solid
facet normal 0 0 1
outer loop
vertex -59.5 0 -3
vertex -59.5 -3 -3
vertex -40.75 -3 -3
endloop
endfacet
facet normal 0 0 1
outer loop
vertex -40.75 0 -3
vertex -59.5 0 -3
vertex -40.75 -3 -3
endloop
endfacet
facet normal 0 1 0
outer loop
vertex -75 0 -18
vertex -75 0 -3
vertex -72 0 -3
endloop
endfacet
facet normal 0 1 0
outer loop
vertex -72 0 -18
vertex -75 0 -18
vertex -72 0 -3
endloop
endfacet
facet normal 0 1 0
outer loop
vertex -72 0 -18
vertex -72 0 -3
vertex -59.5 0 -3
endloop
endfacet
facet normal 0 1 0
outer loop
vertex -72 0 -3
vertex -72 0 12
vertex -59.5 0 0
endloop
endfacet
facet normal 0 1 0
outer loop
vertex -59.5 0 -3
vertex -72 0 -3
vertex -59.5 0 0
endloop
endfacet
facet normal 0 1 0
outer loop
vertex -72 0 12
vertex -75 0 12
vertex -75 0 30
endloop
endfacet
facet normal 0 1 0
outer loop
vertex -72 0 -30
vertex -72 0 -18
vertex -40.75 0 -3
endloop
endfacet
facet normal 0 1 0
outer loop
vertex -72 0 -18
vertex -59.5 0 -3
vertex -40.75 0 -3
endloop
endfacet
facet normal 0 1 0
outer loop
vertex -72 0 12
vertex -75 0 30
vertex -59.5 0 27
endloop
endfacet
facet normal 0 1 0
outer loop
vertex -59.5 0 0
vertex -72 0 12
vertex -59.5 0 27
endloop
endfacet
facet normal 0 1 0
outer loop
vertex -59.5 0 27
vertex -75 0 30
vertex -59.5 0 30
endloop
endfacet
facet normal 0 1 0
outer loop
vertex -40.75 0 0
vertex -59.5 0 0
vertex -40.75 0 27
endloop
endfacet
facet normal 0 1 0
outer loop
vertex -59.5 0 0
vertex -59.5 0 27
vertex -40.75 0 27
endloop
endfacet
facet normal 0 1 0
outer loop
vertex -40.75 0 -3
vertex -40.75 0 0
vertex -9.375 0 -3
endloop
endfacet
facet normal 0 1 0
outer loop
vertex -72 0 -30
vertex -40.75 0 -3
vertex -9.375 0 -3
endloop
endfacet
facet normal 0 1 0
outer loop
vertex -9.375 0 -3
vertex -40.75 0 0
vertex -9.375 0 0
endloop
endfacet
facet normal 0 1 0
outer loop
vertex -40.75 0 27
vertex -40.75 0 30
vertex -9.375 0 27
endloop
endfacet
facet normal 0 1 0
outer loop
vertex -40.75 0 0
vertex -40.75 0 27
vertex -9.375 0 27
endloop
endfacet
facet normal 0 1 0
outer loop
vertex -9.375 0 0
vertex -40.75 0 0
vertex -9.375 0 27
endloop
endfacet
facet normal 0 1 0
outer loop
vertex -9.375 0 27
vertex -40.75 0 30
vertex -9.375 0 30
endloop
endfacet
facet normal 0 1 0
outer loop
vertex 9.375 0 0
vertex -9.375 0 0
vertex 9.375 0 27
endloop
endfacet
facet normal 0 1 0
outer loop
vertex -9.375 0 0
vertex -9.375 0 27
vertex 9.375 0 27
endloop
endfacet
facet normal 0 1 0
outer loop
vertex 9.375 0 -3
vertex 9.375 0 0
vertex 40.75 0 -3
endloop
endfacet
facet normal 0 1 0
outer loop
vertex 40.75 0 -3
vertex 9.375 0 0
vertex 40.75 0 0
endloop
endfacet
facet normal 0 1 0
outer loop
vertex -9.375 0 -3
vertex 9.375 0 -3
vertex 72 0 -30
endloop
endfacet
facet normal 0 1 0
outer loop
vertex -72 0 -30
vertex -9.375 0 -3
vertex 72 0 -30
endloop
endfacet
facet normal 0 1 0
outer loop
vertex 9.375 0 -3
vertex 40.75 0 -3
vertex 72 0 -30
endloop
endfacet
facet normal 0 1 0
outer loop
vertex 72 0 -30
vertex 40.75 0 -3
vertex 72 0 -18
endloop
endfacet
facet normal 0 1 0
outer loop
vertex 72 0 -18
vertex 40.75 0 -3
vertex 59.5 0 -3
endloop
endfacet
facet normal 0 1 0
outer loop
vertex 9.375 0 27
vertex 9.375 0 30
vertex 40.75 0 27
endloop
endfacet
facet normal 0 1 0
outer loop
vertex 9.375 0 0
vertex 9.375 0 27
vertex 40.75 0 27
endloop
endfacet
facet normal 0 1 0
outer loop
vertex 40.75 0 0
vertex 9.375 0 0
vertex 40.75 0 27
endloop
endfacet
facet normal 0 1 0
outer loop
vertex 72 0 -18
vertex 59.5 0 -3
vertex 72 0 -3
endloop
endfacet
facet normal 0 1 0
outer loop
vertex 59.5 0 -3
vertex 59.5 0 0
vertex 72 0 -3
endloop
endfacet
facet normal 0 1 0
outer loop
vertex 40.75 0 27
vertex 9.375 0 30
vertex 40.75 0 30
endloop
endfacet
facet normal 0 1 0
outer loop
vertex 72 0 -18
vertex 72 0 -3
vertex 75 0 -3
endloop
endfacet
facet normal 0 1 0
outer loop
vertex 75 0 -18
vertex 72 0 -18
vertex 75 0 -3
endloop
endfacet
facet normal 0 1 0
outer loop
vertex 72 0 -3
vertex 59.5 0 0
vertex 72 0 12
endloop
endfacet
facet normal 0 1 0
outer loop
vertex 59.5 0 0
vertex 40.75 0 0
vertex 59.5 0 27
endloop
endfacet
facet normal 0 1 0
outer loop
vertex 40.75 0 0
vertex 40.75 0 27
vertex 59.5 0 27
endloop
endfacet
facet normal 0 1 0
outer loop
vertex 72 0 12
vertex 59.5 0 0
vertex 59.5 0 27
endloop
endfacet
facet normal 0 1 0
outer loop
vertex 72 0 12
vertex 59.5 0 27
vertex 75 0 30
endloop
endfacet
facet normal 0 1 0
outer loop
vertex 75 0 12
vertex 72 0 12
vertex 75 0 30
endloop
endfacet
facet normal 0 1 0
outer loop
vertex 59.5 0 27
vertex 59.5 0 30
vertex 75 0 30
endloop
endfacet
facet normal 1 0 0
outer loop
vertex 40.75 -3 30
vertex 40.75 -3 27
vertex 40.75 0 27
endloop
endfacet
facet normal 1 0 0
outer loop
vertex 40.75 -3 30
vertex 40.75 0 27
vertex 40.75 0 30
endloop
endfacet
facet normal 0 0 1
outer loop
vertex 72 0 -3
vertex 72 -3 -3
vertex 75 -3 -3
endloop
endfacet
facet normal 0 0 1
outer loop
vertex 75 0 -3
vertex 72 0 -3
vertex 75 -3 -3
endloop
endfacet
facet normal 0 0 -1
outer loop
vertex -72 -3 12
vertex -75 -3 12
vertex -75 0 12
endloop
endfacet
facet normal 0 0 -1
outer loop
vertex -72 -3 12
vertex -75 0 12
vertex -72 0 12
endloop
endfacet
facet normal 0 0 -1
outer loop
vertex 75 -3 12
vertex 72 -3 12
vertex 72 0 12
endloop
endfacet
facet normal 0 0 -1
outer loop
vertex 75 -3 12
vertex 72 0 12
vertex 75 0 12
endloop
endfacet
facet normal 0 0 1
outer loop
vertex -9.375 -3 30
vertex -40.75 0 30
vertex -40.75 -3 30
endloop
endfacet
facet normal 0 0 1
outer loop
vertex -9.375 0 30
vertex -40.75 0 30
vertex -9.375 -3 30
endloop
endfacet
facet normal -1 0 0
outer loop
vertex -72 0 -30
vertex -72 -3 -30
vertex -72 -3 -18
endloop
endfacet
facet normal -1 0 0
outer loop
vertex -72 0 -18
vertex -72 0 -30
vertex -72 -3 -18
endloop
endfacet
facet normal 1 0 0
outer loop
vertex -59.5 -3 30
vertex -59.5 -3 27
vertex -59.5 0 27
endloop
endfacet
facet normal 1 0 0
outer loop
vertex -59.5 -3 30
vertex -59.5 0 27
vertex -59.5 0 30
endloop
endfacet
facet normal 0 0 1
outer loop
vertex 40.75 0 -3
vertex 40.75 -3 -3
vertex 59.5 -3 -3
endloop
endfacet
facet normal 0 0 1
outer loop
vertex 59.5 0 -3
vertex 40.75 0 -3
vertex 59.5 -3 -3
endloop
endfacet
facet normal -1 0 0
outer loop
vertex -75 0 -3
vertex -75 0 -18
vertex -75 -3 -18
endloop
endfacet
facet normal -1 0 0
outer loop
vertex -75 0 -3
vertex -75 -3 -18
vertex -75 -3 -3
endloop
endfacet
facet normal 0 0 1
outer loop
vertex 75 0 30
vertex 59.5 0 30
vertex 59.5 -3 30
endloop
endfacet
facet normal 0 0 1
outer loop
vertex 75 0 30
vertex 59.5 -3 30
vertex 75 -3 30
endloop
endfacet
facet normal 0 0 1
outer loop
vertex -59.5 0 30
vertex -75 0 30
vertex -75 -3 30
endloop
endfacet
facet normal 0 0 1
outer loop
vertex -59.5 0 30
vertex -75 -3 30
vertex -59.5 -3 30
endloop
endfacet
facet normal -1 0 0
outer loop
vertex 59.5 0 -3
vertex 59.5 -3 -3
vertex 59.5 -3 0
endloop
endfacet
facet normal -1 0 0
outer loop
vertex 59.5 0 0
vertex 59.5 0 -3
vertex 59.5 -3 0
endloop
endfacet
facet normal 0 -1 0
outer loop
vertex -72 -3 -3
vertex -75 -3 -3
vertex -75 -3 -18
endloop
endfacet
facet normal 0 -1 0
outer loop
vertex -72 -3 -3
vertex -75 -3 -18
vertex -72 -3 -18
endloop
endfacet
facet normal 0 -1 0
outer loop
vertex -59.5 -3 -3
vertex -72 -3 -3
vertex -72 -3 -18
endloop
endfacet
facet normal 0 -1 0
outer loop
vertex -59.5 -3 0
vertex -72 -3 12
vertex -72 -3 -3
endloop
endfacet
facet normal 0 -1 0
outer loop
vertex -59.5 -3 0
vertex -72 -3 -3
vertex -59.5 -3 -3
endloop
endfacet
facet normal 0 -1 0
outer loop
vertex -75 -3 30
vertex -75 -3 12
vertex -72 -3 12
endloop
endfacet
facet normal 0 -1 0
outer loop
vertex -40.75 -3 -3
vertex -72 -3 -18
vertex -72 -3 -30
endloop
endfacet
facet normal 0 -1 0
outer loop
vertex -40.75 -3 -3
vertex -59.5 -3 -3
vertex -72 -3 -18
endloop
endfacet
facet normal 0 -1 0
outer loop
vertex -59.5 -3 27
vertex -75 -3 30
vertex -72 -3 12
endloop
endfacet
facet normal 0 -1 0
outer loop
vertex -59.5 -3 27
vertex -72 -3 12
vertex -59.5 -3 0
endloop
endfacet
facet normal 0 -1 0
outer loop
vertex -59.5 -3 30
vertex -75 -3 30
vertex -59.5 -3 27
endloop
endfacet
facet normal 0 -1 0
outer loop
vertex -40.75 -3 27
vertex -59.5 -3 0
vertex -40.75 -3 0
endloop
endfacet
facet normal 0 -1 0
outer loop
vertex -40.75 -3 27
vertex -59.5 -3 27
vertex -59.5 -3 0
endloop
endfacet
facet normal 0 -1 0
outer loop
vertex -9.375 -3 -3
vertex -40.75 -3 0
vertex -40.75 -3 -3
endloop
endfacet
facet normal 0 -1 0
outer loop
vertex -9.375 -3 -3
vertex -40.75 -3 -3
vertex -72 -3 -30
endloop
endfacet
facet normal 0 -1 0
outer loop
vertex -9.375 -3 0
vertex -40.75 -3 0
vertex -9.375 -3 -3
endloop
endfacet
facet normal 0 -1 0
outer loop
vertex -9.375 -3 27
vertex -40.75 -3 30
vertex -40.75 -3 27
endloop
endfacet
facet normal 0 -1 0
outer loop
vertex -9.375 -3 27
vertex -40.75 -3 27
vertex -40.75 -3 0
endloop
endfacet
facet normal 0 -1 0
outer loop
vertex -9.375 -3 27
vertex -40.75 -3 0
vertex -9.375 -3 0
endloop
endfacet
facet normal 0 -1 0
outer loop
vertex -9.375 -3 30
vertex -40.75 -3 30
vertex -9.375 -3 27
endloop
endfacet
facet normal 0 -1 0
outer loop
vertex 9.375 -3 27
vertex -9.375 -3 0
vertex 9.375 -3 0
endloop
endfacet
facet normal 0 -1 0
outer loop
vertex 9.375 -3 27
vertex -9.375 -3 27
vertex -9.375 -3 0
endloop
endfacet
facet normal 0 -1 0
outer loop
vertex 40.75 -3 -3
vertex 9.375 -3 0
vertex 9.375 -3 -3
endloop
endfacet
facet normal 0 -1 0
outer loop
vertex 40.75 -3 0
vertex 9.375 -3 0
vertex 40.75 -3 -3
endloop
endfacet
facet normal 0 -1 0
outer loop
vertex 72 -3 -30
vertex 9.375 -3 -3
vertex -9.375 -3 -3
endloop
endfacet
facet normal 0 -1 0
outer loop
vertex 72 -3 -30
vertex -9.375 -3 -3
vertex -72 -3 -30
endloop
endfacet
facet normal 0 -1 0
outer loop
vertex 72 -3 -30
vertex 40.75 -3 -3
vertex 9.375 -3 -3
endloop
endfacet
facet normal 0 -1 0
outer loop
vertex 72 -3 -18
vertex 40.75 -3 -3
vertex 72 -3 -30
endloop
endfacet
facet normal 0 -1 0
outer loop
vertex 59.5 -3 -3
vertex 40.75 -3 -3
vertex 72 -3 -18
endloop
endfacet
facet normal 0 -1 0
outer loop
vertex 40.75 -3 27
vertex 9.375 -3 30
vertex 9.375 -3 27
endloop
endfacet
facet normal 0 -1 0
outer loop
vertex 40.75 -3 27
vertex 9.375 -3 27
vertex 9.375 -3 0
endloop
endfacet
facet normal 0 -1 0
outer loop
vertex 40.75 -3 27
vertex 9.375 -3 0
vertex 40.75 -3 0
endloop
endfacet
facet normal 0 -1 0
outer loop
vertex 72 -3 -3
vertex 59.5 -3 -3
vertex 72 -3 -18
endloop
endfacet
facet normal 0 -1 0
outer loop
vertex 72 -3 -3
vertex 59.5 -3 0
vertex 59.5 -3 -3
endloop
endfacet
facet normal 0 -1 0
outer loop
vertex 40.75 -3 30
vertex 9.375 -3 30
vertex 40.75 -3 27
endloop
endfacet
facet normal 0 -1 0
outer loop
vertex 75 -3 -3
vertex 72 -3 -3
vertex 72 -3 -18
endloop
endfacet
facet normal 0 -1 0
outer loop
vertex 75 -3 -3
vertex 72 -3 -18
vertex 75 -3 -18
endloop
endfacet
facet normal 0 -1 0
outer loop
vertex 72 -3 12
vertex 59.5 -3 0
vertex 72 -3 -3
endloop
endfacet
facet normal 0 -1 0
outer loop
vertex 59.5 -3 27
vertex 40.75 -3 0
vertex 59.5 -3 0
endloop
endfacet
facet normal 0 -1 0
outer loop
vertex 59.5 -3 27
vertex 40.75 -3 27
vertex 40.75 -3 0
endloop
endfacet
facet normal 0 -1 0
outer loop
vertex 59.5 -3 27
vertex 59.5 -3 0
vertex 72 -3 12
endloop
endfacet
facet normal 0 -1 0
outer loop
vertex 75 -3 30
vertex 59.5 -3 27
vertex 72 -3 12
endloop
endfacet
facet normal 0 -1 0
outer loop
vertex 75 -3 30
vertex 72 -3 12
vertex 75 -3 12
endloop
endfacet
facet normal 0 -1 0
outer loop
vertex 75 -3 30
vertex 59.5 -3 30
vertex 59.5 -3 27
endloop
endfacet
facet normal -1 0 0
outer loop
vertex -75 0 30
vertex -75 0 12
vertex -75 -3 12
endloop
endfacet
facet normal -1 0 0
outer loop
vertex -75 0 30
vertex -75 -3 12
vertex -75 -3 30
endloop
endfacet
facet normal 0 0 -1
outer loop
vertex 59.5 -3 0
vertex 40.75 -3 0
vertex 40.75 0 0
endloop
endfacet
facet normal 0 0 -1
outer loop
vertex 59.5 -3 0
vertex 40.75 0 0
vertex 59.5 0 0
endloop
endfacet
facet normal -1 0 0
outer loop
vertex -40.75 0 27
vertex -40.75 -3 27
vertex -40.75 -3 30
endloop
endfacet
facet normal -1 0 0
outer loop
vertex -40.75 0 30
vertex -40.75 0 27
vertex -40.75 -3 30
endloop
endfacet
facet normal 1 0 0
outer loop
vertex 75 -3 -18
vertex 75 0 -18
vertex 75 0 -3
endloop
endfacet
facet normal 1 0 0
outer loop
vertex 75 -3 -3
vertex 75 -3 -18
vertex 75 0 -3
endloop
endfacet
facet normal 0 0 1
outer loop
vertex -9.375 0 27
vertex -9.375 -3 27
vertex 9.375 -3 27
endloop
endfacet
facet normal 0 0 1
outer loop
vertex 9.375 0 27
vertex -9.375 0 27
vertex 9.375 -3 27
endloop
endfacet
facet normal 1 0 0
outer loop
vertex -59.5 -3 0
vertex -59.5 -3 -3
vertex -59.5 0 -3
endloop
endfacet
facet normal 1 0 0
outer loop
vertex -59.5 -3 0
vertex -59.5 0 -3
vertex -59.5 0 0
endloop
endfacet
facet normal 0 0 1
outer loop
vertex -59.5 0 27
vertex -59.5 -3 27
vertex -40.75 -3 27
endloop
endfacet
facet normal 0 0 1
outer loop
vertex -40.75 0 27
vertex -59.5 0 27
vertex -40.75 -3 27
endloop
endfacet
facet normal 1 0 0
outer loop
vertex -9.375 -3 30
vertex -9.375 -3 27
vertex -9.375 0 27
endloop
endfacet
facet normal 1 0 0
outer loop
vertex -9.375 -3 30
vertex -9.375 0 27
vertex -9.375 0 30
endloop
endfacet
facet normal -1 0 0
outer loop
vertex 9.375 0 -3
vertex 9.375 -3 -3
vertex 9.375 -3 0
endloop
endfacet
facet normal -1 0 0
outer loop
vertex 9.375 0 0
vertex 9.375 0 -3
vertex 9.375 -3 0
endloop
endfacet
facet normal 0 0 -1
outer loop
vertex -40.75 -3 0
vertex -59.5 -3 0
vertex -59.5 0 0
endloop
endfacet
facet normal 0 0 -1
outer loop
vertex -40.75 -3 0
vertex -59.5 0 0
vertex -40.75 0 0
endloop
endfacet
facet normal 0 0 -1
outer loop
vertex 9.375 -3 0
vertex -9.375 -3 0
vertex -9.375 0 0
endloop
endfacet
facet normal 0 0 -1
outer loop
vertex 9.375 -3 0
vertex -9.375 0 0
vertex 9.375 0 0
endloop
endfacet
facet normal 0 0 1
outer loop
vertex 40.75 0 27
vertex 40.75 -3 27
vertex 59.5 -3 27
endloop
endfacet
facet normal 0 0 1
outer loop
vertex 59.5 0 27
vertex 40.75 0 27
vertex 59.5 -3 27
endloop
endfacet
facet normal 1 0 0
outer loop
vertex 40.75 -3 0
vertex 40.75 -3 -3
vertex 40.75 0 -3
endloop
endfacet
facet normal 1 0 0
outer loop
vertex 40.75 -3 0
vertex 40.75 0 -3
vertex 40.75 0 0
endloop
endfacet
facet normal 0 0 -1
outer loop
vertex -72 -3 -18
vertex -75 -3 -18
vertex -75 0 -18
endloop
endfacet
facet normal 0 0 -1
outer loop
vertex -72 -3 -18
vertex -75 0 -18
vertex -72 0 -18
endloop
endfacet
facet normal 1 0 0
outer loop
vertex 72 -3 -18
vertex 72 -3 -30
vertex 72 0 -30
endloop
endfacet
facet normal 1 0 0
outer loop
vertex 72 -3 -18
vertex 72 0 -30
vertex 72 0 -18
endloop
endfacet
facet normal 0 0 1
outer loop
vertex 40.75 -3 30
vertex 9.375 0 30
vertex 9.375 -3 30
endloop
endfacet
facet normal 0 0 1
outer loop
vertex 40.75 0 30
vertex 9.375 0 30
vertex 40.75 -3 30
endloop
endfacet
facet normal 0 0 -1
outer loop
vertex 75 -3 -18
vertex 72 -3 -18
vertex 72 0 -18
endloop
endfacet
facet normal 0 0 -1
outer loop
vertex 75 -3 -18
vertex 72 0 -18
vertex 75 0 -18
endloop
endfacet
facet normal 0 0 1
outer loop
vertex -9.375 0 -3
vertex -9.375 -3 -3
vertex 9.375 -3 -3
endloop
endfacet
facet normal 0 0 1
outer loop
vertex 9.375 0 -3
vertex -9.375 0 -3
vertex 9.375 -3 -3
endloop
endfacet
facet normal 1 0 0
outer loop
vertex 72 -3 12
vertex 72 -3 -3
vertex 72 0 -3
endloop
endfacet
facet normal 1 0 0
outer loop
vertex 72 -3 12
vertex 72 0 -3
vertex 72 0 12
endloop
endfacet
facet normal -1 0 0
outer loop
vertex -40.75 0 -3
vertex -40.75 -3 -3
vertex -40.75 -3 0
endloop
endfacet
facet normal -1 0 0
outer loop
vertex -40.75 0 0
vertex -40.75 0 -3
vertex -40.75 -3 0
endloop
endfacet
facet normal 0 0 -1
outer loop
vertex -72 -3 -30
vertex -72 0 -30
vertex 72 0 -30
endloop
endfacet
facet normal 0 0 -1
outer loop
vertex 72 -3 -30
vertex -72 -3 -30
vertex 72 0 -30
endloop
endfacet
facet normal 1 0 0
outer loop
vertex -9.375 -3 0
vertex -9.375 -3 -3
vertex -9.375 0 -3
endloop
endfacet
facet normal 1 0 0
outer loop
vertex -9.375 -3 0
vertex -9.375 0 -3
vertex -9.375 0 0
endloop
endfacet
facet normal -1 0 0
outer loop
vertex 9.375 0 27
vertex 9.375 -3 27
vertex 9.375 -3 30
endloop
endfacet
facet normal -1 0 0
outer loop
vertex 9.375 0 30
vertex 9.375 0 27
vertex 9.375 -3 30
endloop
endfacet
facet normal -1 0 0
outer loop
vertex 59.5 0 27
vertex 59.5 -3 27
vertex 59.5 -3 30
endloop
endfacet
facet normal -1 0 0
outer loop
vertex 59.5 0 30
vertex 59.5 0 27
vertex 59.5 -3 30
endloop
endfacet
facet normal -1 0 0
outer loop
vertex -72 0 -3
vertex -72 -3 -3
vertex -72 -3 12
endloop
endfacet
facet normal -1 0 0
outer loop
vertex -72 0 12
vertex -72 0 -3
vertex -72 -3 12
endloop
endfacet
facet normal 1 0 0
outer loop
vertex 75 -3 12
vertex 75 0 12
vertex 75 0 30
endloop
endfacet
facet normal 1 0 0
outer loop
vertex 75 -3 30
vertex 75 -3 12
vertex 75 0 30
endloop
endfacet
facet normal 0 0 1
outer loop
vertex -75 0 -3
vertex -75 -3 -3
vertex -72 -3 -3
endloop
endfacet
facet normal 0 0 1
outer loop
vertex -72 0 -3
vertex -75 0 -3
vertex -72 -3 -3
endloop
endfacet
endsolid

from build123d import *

# Parameters (mm, degrees)
F0_W     = 150
F0_H     = 60
F1_DEPTH = 3
F2_W     = 18.75
F2_H     = 3
F3_DEPTH = 3
F4_W     = 3
F4_H     = 15
F5_DEPTH = 3


with BuildPart() as f1:
    # F0 (on Front) → F1 (new body)
    with BuildSketch(Plane.XZ):
        Rectangle(F0_W, F0_H)
    extrude(amount=F1_DEPTH)

    # F2 (on face) → F3 (cut, through all)
    with BuildSketch(Plane.XZ.offset(3)):
        with Locations((-50.125, 28.5)):
            Rectangle(F2_W, F2_H)
        with Locations((-50.125, -1.5)):
            Rectangle(F2_W, F2_H)
        with Locations((0, 28.5)):
            Rectangle(F2_W, F2_H)
        with Locations((0, -1.5)):
            Rectangle(F2_W, F2_H)
        with Locations((50.125, 28.5)):
            Rectangle(F2_W, F2_H)
        with Locations((50.125, -1.5)):
            Rectangle(F2_W, F2_H)
    extrude(amount=-F3_DEPTH, mode=Mode.SUBTRACT)

    # F4 (on face) → F5 (cut, through all)
    with BuildSketch(Plane.XZ.offset(3)):
        with Locations((-73.5, 4.5)):
            Rectangle(F4_W, F4_H)
        with Locations((-73.5, -25.5)):
            Rectangle(F4_W, F4_H)
        with Locations((73.5, 4.5)):
            Rectangle(F4_W, F4_H)
        with Locations((73.5, -25.5)):
            Rectangle(F4_W, F4_H)
    extrude(amount=-F5_DEPTH, mode=Mode.SUBTRACT)


solid = f1.part
